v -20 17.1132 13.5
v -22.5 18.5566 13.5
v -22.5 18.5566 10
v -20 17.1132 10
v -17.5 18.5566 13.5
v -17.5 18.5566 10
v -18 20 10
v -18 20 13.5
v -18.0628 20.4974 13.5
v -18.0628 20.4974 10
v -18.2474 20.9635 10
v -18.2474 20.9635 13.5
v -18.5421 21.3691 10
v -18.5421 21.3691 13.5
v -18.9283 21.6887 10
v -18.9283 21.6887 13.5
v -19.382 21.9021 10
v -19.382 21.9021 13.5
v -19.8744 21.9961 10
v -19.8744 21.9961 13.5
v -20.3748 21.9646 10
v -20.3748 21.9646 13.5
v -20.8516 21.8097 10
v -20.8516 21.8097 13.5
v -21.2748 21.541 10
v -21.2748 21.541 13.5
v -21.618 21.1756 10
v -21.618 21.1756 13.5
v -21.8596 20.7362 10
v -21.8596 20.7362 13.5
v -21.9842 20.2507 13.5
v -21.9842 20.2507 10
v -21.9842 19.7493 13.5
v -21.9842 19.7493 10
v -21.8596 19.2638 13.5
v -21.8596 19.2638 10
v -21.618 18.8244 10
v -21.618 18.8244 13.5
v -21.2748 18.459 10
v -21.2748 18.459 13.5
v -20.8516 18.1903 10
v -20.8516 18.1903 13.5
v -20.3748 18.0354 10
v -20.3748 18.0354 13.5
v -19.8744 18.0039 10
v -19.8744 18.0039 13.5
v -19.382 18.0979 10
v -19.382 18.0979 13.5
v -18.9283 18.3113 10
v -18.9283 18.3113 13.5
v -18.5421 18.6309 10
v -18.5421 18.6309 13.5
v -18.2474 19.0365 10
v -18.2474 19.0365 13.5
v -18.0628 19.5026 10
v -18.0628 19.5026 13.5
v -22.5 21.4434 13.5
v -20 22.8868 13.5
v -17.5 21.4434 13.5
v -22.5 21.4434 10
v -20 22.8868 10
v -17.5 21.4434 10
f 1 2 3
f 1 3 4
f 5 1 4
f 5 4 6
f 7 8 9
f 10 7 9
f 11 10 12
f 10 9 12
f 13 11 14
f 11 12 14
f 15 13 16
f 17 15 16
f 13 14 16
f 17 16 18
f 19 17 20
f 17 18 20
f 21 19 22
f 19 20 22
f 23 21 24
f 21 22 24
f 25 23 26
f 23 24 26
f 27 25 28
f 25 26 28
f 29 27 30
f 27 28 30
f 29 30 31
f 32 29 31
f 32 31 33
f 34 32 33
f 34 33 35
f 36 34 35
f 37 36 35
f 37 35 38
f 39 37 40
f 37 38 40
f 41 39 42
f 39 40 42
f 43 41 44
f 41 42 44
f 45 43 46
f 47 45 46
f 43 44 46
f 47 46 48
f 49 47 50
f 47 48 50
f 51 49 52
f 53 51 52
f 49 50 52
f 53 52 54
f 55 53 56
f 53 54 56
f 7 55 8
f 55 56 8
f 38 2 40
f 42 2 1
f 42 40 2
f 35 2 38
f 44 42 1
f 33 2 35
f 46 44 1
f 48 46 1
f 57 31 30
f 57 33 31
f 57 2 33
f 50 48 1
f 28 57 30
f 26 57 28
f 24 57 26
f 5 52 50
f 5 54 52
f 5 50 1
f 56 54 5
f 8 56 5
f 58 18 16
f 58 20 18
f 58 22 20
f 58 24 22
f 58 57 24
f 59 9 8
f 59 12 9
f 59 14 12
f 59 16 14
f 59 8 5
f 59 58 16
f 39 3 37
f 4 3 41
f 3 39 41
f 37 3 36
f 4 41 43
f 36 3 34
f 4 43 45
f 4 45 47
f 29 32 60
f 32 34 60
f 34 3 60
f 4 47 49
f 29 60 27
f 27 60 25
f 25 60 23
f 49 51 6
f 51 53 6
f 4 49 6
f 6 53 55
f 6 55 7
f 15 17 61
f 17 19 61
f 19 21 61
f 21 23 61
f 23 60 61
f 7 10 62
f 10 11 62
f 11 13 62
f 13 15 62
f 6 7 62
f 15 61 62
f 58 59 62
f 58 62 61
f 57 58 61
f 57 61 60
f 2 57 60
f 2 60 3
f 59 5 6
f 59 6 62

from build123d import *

# Parameters (mm, degrees)
SKETCH1_R           = 2
BOSS_EXTRUDE1_DEPTH = 3.5


with BuildPart() as part:
    # Sketch1 → Boss-Extrude1 (new body)
    with BuildSketch(Plane.XY.offset(13.5)):
        Polygon((-22.5, 18.556624327), (-20, 17.113248654), (-17.5, 18.556624327), (-17.5, 21.443375673), (-20, 22.886751346), (-22.5, 21.443375673), align=None)
        with Locations((-20, 20)):
            Circle(SKETCH1_R, mode=Mode.SUBTRACT)
    extrude(amount=-BOSS_EXTRUDE1_DEPTH)


solid = part.part
